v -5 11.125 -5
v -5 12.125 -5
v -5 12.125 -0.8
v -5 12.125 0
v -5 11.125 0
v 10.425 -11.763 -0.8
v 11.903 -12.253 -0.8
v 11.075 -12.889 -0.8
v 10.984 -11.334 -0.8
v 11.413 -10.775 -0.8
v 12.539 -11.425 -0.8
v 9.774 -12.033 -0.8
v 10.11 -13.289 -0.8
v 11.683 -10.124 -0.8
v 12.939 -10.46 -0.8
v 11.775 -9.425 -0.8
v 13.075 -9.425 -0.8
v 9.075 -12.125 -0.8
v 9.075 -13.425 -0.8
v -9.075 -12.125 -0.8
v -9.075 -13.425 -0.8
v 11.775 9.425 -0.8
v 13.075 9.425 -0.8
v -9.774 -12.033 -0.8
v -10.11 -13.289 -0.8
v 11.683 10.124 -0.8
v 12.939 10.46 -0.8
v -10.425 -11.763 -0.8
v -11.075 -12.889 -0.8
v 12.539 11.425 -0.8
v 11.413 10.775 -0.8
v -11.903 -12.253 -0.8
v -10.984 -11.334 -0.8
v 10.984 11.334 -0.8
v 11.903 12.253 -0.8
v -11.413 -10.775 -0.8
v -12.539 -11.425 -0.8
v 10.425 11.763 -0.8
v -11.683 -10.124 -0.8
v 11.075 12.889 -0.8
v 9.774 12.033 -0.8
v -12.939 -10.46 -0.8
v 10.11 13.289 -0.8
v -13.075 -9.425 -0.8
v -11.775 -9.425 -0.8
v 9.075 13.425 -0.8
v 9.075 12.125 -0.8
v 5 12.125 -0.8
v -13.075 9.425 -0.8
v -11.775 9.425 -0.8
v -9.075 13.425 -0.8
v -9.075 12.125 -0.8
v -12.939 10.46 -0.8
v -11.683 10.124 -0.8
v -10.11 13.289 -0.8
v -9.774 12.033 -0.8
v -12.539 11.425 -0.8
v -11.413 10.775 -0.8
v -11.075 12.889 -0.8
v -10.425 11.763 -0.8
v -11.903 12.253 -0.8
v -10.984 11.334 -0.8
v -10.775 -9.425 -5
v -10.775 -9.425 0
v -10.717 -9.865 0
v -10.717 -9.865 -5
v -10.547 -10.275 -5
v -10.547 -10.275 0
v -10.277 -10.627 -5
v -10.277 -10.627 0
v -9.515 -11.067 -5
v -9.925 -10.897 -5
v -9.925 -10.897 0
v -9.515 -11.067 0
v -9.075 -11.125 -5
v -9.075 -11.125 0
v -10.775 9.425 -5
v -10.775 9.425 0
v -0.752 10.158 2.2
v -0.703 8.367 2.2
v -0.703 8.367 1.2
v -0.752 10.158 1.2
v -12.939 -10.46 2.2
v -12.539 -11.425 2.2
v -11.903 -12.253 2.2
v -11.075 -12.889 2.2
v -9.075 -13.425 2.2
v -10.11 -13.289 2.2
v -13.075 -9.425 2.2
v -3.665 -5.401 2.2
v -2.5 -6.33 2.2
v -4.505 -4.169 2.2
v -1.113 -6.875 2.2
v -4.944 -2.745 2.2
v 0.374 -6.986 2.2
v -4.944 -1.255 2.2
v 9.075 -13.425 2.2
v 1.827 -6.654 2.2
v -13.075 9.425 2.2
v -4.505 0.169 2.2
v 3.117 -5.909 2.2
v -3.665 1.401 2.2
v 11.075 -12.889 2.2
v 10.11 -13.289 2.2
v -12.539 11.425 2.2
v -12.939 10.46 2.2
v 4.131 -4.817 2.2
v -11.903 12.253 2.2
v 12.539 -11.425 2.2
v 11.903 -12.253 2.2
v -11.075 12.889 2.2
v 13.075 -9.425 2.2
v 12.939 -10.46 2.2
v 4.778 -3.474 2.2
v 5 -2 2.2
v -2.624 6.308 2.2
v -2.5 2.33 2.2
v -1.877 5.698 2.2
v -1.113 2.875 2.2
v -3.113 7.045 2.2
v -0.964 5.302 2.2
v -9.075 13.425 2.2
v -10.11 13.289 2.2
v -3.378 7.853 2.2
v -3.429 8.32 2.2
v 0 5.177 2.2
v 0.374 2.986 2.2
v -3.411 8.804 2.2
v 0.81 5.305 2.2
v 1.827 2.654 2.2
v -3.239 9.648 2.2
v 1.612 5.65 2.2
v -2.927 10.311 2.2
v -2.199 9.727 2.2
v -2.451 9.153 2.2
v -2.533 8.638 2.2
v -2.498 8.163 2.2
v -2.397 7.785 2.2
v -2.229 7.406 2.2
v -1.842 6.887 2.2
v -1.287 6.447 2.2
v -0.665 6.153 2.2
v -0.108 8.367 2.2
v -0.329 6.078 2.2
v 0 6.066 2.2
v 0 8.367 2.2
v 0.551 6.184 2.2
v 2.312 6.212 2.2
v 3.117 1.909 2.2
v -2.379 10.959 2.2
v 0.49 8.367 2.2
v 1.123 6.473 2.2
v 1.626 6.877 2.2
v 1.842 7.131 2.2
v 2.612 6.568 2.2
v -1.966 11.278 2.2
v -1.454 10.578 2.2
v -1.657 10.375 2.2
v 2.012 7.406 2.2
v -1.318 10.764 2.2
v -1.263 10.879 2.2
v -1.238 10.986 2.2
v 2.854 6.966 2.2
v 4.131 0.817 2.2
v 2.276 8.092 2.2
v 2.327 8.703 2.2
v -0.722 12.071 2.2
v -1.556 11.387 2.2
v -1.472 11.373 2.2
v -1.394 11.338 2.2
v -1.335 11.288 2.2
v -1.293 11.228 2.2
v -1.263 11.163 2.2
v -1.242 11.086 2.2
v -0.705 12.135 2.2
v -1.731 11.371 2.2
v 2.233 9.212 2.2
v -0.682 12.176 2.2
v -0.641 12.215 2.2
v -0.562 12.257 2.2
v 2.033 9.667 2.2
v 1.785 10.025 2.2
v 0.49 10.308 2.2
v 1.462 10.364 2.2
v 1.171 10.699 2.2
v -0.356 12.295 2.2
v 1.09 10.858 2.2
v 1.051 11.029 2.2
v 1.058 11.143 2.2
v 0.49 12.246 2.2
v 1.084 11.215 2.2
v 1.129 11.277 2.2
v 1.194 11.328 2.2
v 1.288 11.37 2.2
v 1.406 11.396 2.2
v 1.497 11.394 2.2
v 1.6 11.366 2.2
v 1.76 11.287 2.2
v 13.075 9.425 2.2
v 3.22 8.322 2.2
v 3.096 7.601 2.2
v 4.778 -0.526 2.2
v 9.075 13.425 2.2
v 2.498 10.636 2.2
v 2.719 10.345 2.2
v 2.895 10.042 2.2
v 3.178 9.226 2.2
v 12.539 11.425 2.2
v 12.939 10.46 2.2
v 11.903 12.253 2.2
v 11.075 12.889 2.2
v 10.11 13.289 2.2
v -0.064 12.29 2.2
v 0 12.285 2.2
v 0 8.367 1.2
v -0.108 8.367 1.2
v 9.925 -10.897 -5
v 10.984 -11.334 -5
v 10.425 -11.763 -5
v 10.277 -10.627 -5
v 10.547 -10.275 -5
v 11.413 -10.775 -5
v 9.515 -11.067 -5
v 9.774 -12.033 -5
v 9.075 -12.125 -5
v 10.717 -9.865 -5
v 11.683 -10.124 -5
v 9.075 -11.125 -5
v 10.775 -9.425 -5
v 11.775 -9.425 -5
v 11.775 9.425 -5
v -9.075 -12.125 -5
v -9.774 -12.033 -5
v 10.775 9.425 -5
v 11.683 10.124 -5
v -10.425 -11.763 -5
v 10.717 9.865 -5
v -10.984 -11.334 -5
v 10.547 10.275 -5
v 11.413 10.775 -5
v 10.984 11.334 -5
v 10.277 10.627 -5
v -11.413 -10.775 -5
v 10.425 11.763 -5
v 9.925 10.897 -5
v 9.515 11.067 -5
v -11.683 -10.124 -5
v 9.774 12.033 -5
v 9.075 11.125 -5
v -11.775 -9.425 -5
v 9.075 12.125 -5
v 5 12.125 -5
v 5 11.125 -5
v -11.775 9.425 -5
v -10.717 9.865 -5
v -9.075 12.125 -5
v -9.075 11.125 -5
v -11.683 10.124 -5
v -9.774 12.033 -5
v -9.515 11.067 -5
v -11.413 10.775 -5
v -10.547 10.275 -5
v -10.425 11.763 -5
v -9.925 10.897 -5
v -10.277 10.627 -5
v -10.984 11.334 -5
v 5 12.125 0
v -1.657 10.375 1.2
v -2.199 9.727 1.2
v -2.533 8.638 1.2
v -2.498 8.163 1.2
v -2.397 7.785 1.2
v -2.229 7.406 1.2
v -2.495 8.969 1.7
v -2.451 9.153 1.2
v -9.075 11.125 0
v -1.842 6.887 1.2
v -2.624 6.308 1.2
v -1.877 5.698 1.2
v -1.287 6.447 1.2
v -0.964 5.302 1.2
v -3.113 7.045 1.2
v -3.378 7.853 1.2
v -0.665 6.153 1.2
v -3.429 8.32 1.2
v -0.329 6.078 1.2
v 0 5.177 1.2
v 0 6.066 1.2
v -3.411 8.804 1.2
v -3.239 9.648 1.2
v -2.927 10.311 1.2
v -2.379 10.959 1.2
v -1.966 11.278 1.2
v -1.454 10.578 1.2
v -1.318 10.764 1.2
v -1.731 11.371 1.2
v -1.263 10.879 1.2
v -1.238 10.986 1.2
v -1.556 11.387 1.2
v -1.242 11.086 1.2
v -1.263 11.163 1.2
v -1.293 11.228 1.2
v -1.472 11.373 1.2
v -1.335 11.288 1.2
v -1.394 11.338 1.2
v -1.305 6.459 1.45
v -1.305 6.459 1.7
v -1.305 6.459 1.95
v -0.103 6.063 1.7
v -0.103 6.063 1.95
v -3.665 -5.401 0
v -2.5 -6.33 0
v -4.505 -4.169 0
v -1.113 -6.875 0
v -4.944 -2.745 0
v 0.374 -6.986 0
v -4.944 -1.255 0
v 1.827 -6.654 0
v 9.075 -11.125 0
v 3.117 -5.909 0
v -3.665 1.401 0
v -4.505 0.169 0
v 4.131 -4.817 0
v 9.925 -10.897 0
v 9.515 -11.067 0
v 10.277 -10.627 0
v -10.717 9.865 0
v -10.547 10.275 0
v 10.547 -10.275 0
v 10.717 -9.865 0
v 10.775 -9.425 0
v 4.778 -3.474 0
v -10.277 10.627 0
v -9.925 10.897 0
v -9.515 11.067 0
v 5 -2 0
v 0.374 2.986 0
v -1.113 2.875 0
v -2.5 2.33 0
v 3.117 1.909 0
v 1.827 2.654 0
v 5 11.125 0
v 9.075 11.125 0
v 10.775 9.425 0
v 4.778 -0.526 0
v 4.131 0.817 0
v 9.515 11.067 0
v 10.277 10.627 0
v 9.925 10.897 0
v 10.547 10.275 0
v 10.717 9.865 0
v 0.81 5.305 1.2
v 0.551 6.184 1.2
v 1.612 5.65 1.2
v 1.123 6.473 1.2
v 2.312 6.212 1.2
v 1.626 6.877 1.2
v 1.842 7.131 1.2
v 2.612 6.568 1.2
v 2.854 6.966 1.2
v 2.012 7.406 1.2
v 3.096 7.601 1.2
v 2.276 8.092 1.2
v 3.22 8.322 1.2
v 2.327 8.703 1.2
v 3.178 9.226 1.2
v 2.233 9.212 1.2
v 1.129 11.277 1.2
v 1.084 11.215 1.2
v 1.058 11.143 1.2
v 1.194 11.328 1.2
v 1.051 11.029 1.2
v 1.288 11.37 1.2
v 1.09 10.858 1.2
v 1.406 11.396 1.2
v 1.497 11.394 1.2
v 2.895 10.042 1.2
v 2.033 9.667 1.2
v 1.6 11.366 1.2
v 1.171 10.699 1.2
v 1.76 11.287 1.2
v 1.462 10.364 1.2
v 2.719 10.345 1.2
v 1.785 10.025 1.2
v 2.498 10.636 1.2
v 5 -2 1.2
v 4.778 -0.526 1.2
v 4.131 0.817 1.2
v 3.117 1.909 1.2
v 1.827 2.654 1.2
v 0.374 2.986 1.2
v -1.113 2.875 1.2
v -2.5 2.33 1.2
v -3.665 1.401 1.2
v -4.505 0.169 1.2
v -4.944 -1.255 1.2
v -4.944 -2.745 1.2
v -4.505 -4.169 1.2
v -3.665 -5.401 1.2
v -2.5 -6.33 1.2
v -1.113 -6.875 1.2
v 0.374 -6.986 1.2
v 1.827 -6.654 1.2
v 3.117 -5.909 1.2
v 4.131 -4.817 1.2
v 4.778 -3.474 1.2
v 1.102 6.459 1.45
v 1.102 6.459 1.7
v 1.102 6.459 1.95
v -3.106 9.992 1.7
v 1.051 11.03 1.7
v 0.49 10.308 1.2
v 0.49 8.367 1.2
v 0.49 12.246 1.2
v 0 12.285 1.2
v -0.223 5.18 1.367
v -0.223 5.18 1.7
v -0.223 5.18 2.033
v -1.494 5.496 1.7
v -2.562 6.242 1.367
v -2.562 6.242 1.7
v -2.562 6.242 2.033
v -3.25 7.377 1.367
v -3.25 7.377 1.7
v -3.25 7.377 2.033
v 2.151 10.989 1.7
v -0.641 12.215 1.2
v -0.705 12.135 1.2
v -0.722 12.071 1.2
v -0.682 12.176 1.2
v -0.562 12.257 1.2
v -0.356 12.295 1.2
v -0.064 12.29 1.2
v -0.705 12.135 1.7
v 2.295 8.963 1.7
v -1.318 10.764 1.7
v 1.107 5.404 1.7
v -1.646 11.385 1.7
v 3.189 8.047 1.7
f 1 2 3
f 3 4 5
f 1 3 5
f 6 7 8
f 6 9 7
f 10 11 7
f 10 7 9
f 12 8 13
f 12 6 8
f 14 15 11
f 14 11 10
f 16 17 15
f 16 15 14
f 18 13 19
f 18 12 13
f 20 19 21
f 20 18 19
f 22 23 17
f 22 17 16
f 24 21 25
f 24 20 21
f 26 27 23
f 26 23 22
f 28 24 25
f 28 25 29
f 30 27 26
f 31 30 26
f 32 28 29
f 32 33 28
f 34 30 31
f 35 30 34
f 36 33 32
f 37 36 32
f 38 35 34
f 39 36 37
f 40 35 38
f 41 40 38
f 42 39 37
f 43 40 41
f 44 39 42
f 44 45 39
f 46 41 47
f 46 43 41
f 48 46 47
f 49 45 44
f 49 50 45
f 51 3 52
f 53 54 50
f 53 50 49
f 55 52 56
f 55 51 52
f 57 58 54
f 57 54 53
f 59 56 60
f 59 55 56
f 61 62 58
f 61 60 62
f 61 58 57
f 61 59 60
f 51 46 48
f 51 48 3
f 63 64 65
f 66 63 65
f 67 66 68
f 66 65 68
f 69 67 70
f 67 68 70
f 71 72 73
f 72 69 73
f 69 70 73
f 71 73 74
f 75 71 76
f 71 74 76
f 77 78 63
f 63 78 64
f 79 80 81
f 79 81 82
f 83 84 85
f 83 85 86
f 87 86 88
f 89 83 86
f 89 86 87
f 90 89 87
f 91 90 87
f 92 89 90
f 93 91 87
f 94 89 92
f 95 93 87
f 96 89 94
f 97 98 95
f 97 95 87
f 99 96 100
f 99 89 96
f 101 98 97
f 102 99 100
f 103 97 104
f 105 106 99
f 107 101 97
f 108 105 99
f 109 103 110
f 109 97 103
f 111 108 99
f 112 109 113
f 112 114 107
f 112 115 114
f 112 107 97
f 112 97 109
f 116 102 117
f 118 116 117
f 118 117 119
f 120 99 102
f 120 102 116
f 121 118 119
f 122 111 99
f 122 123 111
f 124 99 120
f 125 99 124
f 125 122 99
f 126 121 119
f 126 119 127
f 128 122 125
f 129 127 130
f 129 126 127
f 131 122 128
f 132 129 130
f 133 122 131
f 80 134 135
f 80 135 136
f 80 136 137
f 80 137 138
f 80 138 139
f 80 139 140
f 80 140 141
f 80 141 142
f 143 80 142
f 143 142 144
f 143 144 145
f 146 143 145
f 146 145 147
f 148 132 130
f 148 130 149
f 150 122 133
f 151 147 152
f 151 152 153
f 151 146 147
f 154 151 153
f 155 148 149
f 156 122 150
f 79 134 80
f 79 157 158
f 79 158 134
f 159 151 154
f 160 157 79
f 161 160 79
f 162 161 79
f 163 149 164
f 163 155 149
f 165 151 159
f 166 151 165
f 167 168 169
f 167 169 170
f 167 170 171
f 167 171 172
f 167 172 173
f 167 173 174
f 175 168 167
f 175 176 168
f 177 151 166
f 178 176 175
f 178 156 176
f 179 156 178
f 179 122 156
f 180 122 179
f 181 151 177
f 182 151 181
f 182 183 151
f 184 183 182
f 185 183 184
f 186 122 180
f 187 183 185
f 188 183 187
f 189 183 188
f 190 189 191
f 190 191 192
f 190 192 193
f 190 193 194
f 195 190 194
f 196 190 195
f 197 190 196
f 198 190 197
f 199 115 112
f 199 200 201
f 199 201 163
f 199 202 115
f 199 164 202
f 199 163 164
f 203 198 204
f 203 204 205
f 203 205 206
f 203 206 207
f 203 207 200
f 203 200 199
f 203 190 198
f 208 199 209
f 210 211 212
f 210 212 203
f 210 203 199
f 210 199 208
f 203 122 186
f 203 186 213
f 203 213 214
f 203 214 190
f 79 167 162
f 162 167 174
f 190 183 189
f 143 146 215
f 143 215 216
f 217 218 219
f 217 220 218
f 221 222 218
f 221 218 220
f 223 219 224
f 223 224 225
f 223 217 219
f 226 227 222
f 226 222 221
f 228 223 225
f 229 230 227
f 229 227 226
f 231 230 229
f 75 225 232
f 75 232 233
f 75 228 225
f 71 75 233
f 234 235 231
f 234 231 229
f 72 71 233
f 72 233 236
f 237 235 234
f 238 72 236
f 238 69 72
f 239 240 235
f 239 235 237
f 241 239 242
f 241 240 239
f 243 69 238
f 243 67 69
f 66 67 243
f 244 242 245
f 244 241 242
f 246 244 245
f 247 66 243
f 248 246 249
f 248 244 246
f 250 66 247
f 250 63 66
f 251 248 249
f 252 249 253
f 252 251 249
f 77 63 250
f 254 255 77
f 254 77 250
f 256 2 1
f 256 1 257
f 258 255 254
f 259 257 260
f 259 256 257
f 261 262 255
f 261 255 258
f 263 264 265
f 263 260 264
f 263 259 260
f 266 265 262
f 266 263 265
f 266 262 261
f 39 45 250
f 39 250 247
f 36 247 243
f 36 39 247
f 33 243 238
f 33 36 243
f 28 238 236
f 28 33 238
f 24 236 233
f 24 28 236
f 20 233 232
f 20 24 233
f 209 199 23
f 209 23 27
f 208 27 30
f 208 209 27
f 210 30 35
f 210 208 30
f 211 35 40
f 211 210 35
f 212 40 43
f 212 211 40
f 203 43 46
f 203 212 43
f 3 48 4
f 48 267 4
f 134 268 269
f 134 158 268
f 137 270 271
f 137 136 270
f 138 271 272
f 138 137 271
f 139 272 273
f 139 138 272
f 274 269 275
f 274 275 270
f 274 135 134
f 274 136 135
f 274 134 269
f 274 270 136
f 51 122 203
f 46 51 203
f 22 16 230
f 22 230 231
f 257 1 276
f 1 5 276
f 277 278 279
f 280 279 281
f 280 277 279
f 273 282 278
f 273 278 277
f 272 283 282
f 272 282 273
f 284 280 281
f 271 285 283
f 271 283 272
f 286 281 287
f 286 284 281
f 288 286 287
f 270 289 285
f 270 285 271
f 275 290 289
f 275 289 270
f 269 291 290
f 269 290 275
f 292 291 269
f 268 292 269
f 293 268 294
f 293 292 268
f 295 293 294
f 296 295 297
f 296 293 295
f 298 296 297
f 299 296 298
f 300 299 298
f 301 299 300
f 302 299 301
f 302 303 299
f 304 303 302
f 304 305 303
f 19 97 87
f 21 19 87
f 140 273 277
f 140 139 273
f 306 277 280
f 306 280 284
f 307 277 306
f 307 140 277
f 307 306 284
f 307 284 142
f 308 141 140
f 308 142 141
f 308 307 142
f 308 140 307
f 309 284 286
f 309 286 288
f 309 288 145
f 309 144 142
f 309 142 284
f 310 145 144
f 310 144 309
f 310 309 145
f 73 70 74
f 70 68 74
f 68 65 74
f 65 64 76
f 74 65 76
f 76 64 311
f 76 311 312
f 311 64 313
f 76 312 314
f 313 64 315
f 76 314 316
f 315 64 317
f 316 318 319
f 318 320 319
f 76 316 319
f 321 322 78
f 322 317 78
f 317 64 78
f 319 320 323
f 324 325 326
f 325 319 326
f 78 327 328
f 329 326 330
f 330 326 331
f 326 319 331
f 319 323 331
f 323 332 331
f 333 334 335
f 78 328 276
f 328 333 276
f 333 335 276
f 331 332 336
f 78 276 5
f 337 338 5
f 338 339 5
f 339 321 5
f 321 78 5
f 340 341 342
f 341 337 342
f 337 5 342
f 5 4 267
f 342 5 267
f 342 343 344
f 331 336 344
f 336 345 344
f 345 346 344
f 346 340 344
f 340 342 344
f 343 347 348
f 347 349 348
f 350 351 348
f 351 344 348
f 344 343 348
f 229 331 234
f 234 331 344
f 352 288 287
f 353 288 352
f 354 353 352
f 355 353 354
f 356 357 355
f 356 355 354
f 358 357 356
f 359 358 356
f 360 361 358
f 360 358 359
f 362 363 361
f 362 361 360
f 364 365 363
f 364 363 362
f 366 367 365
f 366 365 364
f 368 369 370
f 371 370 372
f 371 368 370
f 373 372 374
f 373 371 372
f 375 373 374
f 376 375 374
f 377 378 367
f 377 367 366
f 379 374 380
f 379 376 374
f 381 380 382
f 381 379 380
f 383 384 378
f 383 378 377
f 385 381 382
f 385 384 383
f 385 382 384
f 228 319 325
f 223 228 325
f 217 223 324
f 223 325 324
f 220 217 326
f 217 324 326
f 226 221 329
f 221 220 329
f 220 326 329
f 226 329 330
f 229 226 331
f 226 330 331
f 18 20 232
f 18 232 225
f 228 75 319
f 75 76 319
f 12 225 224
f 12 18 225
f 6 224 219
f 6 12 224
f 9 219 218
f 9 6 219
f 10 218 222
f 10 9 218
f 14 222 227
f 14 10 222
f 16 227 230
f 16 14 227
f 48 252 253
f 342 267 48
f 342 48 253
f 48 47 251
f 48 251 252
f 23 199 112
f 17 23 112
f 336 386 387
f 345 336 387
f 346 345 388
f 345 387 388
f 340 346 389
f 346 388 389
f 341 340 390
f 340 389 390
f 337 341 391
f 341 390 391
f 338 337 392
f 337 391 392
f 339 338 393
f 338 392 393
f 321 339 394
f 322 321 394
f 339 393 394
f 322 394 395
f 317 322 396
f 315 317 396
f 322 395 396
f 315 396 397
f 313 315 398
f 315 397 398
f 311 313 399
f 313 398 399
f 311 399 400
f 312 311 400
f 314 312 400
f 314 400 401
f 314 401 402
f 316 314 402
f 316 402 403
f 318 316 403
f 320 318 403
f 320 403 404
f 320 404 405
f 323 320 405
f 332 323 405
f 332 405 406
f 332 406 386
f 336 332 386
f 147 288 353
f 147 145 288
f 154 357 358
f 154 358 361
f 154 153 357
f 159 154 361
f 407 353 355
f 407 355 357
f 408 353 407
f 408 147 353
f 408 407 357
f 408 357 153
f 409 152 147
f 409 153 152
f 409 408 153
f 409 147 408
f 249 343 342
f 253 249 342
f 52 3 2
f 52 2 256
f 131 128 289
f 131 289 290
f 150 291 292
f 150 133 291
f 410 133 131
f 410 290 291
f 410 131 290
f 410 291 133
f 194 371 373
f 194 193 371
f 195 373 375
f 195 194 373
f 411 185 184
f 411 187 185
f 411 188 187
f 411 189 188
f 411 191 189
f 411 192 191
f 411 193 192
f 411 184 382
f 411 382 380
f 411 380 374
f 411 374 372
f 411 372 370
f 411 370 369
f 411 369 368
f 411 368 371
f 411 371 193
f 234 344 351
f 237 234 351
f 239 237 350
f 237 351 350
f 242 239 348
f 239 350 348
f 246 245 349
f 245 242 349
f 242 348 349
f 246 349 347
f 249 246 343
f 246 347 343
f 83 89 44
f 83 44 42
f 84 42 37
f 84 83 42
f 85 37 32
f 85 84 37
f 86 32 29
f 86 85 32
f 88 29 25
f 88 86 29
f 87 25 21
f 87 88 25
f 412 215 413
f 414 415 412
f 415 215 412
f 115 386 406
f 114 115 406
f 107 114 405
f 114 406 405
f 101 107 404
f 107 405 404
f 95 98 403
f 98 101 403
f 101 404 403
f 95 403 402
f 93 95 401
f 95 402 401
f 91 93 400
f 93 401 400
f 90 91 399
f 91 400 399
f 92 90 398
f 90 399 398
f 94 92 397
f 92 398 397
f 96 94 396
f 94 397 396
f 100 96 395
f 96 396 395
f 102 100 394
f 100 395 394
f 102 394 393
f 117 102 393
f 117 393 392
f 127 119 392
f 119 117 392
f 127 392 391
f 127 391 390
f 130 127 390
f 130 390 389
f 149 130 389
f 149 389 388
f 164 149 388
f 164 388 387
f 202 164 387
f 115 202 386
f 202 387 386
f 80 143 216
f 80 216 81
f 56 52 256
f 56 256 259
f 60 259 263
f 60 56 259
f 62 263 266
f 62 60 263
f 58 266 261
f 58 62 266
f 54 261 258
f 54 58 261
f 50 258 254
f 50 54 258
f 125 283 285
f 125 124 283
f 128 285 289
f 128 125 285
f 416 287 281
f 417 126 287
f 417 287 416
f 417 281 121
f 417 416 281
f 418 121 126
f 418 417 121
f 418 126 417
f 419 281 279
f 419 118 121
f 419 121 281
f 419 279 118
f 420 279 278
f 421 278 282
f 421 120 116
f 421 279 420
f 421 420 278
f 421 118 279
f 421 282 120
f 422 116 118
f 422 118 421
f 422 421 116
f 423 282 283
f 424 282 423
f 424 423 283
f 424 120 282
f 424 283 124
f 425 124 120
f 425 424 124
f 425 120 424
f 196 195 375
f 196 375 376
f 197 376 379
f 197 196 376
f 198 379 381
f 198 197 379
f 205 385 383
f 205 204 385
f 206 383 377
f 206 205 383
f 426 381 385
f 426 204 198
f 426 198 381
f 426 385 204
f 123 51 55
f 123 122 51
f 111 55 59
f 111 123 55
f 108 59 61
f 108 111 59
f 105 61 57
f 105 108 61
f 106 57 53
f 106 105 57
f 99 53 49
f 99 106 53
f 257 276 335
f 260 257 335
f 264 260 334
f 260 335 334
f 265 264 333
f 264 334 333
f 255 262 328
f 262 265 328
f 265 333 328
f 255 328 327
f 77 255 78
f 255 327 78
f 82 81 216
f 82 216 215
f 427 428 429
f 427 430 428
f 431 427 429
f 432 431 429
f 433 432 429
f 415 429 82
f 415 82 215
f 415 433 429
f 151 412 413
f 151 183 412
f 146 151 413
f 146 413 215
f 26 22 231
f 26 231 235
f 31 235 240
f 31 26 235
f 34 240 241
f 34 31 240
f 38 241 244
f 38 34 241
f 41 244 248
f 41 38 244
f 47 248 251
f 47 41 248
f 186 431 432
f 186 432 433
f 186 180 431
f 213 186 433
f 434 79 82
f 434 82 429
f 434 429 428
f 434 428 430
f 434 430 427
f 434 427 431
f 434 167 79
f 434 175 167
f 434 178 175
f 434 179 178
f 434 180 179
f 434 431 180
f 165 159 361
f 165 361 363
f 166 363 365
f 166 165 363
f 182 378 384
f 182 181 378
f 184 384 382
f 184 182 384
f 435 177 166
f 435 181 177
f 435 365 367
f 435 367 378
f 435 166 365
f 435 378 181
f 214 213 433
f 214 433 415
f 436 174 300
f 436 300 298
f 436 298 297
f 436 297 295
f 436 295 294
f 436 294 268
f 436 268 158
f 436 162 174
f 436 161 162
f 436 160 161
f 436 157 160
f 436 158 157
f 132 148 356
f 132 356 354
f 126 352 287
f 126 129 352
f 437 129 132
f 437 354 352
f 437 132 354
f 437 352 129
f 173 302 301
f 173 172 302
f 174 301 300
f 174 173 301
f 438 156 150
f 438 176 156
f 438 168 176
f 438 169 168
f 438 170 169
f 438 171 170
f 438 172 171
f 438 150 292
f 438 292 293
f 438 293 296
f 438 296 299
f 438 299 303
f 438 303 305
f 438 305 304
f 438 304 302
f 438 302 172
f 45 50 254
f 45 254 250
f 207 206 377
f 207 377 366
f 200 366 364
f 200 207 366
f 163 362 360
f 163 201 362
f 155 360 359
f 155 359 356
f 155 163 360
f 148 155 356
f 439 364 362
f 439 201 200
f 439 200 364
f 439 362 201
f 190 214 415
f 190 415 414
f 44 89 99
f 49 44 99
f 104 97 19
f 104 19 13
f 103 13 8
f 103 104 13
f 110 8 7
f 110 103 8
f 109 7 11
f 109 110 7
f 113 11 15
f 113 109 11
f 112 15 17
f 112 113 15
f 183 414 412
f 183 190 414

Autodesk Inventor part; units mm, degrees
ref_plane "YZ Plane" through (0, 0, 0) normal (1, 0, 0) x (0, 1, 0)
ref_plane "XZ Plane" through (0, 0, 0) normal (0, 1, 0) x (-1, 0, 0)
ref_plane "XY Plane" through (0, 0, 0) normal (0, 0, 1) x (1, 0, 0)
ref_plane "Work Plane1" through (0, 0, 0) normal (0, 0, 1) x (1, 0, 0)
sketch "Sketch1" plane through (0, 0, 0) normal (0, 0, 1) x (1, 0, 0)
  line L0 (13.075, 9.425) -> (13.075, -9.425) projected
  arc A0 (13.075, 9.425) -> (9.075, 13.425) centre (9.075, 9.425) ccw projected
  line L1 (5, 13.425) -> (9.075, 13.425) projected
  line L2 (-4, 13.425) -> (4, 13.425) projected
  line L3 (5, 13.425) -> (4, 13.425) projected
  line L4 (-4, 13.425) -> (-5, 13.425) projected
  line L5 (-9.075, 13.425) -> (-5, 13.425) projected
  arc A1 (-9.075, 13.425) -> (-13.075, 9.425) centre (-9.075, 9.425) ccw projected
  line L6 (-13.075, -9.425) -> (-13.075, 9.425) projected
  arc A2 (-13.075, -9.425) -> (-9.075, -13.425) centre (-9.075, -9.425) ccw projected
  line L7 (9.075, -13.425) -> (-9.075, -13.425) projected
  arc A3 (9.075, -13.425) -> (13.075, -9.425) centre (9.075, -9.425) ccw projected
  point P0 (0, 0)
extrude "Extrusion1" add sketch "Sketch1" along normal blind 1.2
sketch "Sketch2" plane through (0, 0, 1.2) normal (0, 0, 1) x (1, 0, 0)
  circle A0 centre (0, -2) radius 3.85
  line L0 (-9.075, -13.425) -> (9.075, -13.425)
  point P0 (0, 0)
  dimension "d10" = 13.425
  dimension "d11" = 2
extrude "Extrusion2" cut sketch "Sketch2" against normal blind 1.2
sketch "Sketch3" plane through (0, 0, 0) normal (0, 0, -1) x (-1, 0, 0)
  arc A0 (-9.075, 12.225) -> (-11.875, 9.425) centre (-9.075, 9.425) ccw projected
  line L0 (-9.075, 12.225) -> (-5, 12.225) projected
  line L1 (-11.875, -9.425) -> (-11.875, 9.425) projected
  arc A1 (-11.875, -9.425) -> (-9.075, -12.225) centre (-9.075, -9.425) ccw projected
  line L2 (9.075, -12.225) -> (-9.075, -12.225) projected
  arc A2 (9.075, -12.225) -> (11.875, -9.425) centre (9.075, -9.425) ccw projected
  line L3 (11.875, 9.425) -> (11.875, -9.425) projected
  arc A3 (11.875, 9.425) -> (9.075, 12.225) centre (9.075, 9.425) ccw projected
  line L4 (5, 12.225) -> (9.075, 12.225) projected
  line L5 (5, 12.125) -> (9.075, 12.125)
  arc A4 (11.775, 9.425) -> (9.075, 12.125) centre (9.075, 9.425) ccw
  line L6 (11.775, 9.425) -> (11.775, -9.425)
  arc A5 (9.075, -12.125) -> (11.775, -9.425) centre (9.075, -9.425) ccw
  line L7 (9.075, -12.125) -> (-9.075, -12.125)
  arc A6 (-11.775, -9.425) -> (-9.075, -12.125) centre (-9.075, -9.425) ccw
  line L8 (-11.775, -9.425) -> (-11.775, 9.425)
  arc A7 (-9.075, 12.125) -> (-11.775, 9.425) centre (-9.075, 9.425) ccw
  line L9 (-9.075, 12.125) -> (-5, 12.125)
  line L10 (5, 11.125) -> (9.075, 11.125)
  arc A8 (10.775, 9.425) -> (9.075, 11.125) centre (9.075, 9.425) ccw
  line L11 (10.775, 9.425) -> (10.775, -9.425)
  arc A9 (9.075, -11.125) -> (10.775, -9.425) centre (9.075, -9.425) ccw
  line L12 (9.075, -11.125) -> (-9.075, -11.125)
  arc A10 (-10.775, -9.425) -> (-9.075, -11.125) centre (-9.075, -9.425) ccw
  line L13 (-10.775, -9.425) -> (-10.775, 9.425)
  arc A11 (-9.075, 11.125) -> (-10.775, 9.425) centre (-9.075, 9.425) ccw
  line L14 (-9.075, 11.125) -> (-5, 11.125)
  line L15 (-5, 12.125) -> (-5, 11.125)
  line L16 (5, 12.125) -> (5, 11.125)
  point P0 (0, 0)
  dimension "d5" = 0.1
  dimension "d6" = 1
extrude "Extrusion3" add sketch "Sketch3" along normal blind 5
sketch "Sketch4" plane through (0, 0, 1.2) normal (0, 0, 1) x (1, 0, 0)
  circle A0 centre (0, -2) radius 3.85 construction
  circle A1 centre (0, -2) radius 5
  point P0 (0, 0)
  dimension "d12" = 10
extrude "Extrusion4" cut sketch "Sketch4" against normal blind 10
sketch "Sketch5" plane through (0, 0, 1.2) normal (0, 0, 1) x (1, 0, 0)
  circle A0 centre (0, -2) radius 5 projected
  line L0 (13.075, -9.425) -> (13.075, 9.425) projected
  arc A1 (13.075, 9.425) -> (9.075, 13.425) centre (9.075, 9.425) ccw projected
  line L1 (9.075, 13.425) -> (-9.075, 13.425) projected
  arc A2 (-9.075, 13.425) -> (-13.075, 9.425) centre (-9.075, 9.425) ccw projected
  line L2 (-13.075, 9.425) -> (-13.075, -9.425) projected
  arc A3 (-13.075, -9.425) -> (-9.075, -13.425) centre (-9.075, -9.425) ccw projected
  line L3 (-9.075, -13.425) -> (9.075, -13.425) projected
  arc A4 (9.075, -13.425) -> (13.075, -9.425) centre (9.075, -9.425) ccw projected
  point P0 (0, 0)
extrude "Extrusion5" add sketch "Sketch5" along normal blind 1
sketch "Sketch6" plane through (0, 0, 0) normal (0, 0, -1) x (-1, 0, 0)
  arc A0 (-9.075, 13.425) -> (-13.075, 9.425) centre (-9.075, 9.425) ccw projected
  line L0 (-13.075, 9.425) -> (-13.075, -9.425) projected
  arc A1 (-13.075, -9.425) -> (-9.075, -13.425) centre (-9.075, -9.425) ccw projected
  line L1 (-9.075, -13.425) -> (9.075, -13.425) projected
  arc A2 (9.075, -13.425) -> (13.075, -9.425) centre (9.075, -9.425) ccw projected
  line L2 (13.075, -9.425) -> (13.075, 9.425) projected
  arc A3 (13.075, 9.425) -> (9.075, 13.425) centre (9.075, 9.425) ccw projected
  line L3 (9.075, 13.425) -> (-9.075, 13.425) projected
  line L4 (-5, 12.125) -> (-9.075, 12.125) projected
  arc A4 (-9.075, 12.125) -> (-11.775, 9.425) centre (-9.075, 9.425) ccw projected
  line L5 (-11.775, 9.425) -> (-11.775, -9.425) projected
  arc A5 (-11.775, -9.425) -> (-9.075, -12.125) centre (-9.075, -9.425) ccw projected
  line L6 (-9.075, -12.125) -> (9.075, -12.125) projected
  arc A6 (9.075, -12.125) -> (11.775, -9.425) centre (9.075, -9.425) ccw projected
  line L7 (11.775, -9.425) -> (11.775, 9.425) projected
  arc A7 (11.775, 9.425) -> (9.075, 12.125) centre (9.075, 9.425) ccw projected
  line L8 (9.075, 12.125) -> (5, 12.125) projected
  line L9 (-5, 12.125) -> (5, 12.125)
  point P0 (0, 0)
extrude "Extrusion6" add sketch "Sketch6" along normal blind 0.8
sketch "Sketch7" plane through (0, 0, 2.2) normal (0, 0, 1) x (1, 0, 0)
  line L0 (-4.3978, 12.3352) -> (4.3978, 12.3352) construction
  line L1 (4.3978, 12.3352) -> (4.3978, 5.3989) construction
  line L2 (4.3978, 5.3989) -> (-4.3978, 5.3989) construction
  line L3 (-4.3978, 5.3989) -> (-4.3978, 12.3352) construction
  line L4 (0, -18.795) -> (0, 18.795) projected
  spline S0 degree 2 poles (-2.3788, 10.9588) (-1.9786, 11.3515) (-1.3128, 11.4189) (-1.2418, 11.086) knots 0 0 0 1 2 2 2
  spline S1 degree 2 poles (-1.2418, 11.086) (-1.1857, 10.798) (-1.657, 10.3753) knots 0 0 0 1 1 1
  spline S2 degree 2 poles (-1.657, 10.3753) (-2.3452, 9.7432) (-2.6444, 8.1947) (-2.2292, 7.4055) knots 0 0 0 1 2 2 2
  spline S3 degree 2 poles (-2.2292, 7.4055) (-1.93, 6.8557) (-0.6807, 6.0627) (0.475, 6.0627) (1.728, 6.8557) (2.0123, 7.4055) knots 0 0 0 1 2 3 4 4 4
  spline S4 degree 2 poles (2.0123, 7.4055) (2.4387, 8.1947) (2.1507, 9.732) (1.4625, 10.3641) knots 0 0 0 1 2 2 2
  spline S5 degree 2 poles (1.4625, 10.3641) (1.0735, 10.7194) (1.0286, 11.3403) (1.4064, 11.3964) knots 0 0 0 1 2 2 2
  spline S6 degree 2 poles (1.4064, 11.3964) (1.657, 11.4301) (2.6444, 10.5474) (2.895, 10.0424) knots 0 0 0 1 2 2 2
  spline S7 degree 2 poles (2.895, 10.0424) (3.355, 9.1597) (3.0222, 6.9342) (2.3115, 6.2124) knots 0 0 0 1 2 2 2
  spline S8 degree 2 poles (2.3115, 6.2124) (1.7841, 5.6625) (0.4301, 5.1464) (-0.8752, 5.2137) (-2.1133, 5.7785) (-3.0109, 6.7061) (-3.4897, 8.0488) (-3.4112, 8.8044) knots 0 0 0 1 2 3 4 5 6 6 6
  spline S9 degree 2 poles (-3.4112, 8.8044) (-3.3289, 9.515) (-2.8838, 10.4688) (-2.3788, 10.9588) knots 0 0 0 1 2 2 2
  spline S10 degree 2 poles (-0.7518, 10.1584) (-0.7855, 11.935) (-0.6246, 12.3352) (-0.0636, 12.2903) knots 0 0 0 1 2 2 2
  line L5 (-0.0636, 12.2903) -> (0.49, 12.2455)
  line L6 (0.49, 12.2455) -> (0.49, 10.308)
  line L7 (0.49, 10.308) -> (0.49, 8.3668)
  line L8 (0.49, 8.3668) -> (-0.1085, 8.3668)
  line L9 (-0.1085, 8.3668) -> (-0.7032, 8.3668)
  line L10 (-0.7032, 8.3668) -> (-0.7518, 10.1584)
  point P0 (0, 0)
  point P1 (0, 12.3352)
extrude "Extrusion7" cut sketch "Sketch7" against normal blind 1
properties part number "cap"
